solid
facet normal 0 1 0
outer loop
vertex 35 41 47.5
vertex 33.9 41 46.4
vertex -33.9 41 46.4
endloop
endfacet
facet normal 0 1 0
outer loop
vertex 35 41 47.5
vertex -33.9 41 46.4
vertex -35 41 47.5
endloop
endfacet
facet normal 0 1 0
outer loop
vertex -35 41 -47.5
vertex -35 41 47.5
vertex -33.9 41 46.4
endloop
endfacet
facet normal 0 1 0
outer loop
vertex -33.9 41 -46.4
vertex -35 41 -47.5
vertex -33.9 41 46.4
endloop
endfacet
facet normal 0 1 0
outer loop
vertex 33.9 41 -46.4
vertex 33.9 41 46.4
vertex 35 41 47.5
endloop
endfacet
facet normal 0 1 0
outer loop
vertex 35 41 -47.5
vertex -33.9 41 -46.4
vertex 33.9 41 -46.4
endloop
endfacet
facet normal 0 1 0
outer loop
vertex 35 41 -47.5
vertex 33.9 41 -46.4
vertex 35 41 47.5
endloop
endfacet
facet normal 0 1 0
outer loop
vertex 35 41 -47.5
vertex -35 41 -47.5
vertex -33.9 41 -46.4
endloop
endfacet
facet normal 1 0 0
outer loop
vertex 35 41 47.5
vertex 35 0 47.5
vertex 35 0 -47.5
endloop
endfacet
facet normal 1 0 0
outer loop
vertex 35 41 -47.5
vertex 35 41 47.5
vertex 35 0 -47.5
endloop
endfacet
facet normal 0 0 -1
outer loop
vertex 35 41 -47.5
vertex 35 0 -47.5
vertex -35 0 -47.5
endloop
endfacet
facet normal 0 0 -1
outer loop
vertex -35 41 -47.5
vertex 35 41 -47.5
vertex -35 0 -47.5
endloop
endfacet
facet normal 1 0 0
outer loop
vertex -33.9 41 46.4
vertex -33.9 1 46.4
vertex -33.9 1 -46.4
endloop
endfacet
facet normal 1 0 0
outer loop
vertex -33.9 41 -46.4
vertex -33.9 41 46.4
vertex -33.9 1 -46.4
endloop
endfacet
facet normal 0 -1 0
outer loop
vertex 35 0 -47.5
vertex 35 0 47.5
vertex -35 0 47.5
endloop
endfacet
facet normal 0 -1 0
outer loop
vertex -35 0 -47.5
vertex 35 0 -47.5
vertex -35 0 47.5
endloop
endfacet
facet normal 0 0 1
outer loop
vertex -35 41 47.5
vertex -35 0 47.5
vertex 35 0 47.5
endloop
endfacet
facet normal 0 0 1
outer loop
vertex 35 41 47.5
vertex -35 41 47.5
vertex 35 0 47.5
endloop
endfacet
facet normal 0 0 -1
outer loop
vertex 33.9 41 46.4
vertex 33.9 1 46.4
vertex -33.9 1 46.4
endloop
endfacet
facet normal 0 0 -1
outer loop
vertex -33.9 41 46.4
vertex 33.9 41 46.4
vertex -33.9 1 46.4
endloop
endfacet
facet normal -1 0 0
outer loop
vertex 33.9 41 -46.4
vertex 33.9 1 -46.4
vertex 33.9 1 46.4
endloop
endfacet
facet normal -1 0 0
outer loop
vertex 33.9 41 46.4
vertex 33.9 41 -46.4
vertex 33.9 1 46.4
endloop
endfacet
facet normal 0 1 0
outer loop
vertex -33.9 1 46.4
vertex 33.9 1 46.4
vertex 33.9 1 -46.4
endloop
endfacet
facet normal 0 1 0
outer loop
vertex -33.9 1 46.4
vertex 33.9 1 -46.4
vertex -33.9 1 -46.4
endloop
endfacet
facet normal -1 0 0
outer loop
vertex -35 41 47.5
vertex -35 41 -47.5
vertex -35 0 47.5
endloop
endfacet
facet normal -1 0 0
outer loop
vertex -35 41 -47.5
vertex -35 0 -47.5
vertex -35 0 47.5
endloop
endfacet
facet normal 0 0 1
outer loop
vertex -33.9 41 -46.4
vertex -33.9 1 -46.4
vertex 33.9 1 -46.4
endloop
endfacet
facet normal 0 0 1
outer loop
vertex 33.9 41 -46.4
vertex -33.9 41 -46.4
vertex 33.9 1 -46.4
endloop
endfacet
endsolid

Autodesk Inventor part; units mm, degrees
ref_plane "YZ Plane" through (0, 0, 0) normal (1, 0, 0) x (0, 1, 0)
ref_plane "XZ Plane" through (0, 0, 0) normal (0, 1, 0) x (-1, 0, 0)
ref_plane "XY Plane" through (0, 0, 0) normal (0, 0, 1) x (1, 0, 0)
sketch "Skizze1" plane through (0, 0, 0) normal (0, 1, 0) x (-1, 0, 0)
  line L0 (49, 0) -> (-49, 0) projected
  line L1 (0, -66.5) -> (0, 66.5) projected
  line L2 (-35, 47.5) -> (35, 47.5)
  line L3 (35, 47.5) -> (35, -47.5)
  line L4 (35, -47.5) -> (-35, -47.5)
  line L5 (-35, -47.5) -> (-35, 47.5)
  point P0 (0, 0)
  dimension "d0" = 70
  dimension "d1" = 95
extrude "Extrusion1" add sketch "Skizze1" along normal blind 1
sketch "Skizze2" plane through (0, 1, 0) normal (0, 1, 0) x (1, 0, 0)
  line L0 (-35, -47.5) -> (35, -47.5) projected
  line L1 (35, -47.5) -> (35, 47.5) projected
  line L2 (35, 47.5) -> (-35, 47.5) projected
  line L3 (-35, 47.5) -> (-35, -47.5) projected
  line L4 (-33.9, 46.4) -> (33.9, 46.4)
  line L5 (33.9, 46.4) -> (33.9, -46.4)
  line L6 (33.9, -46.4) -> (-33.9, -46.4)
  line L7 (-33.9, -46.4) -> (-33.9, 46.4)
  point P0 (0, 0)
  dimension "d4" = 1.1
extrude "Extrusion2" add sketch "Skizze2" along normal blind 40
properties part number "Boden" material "ABS-Kunststoff"
